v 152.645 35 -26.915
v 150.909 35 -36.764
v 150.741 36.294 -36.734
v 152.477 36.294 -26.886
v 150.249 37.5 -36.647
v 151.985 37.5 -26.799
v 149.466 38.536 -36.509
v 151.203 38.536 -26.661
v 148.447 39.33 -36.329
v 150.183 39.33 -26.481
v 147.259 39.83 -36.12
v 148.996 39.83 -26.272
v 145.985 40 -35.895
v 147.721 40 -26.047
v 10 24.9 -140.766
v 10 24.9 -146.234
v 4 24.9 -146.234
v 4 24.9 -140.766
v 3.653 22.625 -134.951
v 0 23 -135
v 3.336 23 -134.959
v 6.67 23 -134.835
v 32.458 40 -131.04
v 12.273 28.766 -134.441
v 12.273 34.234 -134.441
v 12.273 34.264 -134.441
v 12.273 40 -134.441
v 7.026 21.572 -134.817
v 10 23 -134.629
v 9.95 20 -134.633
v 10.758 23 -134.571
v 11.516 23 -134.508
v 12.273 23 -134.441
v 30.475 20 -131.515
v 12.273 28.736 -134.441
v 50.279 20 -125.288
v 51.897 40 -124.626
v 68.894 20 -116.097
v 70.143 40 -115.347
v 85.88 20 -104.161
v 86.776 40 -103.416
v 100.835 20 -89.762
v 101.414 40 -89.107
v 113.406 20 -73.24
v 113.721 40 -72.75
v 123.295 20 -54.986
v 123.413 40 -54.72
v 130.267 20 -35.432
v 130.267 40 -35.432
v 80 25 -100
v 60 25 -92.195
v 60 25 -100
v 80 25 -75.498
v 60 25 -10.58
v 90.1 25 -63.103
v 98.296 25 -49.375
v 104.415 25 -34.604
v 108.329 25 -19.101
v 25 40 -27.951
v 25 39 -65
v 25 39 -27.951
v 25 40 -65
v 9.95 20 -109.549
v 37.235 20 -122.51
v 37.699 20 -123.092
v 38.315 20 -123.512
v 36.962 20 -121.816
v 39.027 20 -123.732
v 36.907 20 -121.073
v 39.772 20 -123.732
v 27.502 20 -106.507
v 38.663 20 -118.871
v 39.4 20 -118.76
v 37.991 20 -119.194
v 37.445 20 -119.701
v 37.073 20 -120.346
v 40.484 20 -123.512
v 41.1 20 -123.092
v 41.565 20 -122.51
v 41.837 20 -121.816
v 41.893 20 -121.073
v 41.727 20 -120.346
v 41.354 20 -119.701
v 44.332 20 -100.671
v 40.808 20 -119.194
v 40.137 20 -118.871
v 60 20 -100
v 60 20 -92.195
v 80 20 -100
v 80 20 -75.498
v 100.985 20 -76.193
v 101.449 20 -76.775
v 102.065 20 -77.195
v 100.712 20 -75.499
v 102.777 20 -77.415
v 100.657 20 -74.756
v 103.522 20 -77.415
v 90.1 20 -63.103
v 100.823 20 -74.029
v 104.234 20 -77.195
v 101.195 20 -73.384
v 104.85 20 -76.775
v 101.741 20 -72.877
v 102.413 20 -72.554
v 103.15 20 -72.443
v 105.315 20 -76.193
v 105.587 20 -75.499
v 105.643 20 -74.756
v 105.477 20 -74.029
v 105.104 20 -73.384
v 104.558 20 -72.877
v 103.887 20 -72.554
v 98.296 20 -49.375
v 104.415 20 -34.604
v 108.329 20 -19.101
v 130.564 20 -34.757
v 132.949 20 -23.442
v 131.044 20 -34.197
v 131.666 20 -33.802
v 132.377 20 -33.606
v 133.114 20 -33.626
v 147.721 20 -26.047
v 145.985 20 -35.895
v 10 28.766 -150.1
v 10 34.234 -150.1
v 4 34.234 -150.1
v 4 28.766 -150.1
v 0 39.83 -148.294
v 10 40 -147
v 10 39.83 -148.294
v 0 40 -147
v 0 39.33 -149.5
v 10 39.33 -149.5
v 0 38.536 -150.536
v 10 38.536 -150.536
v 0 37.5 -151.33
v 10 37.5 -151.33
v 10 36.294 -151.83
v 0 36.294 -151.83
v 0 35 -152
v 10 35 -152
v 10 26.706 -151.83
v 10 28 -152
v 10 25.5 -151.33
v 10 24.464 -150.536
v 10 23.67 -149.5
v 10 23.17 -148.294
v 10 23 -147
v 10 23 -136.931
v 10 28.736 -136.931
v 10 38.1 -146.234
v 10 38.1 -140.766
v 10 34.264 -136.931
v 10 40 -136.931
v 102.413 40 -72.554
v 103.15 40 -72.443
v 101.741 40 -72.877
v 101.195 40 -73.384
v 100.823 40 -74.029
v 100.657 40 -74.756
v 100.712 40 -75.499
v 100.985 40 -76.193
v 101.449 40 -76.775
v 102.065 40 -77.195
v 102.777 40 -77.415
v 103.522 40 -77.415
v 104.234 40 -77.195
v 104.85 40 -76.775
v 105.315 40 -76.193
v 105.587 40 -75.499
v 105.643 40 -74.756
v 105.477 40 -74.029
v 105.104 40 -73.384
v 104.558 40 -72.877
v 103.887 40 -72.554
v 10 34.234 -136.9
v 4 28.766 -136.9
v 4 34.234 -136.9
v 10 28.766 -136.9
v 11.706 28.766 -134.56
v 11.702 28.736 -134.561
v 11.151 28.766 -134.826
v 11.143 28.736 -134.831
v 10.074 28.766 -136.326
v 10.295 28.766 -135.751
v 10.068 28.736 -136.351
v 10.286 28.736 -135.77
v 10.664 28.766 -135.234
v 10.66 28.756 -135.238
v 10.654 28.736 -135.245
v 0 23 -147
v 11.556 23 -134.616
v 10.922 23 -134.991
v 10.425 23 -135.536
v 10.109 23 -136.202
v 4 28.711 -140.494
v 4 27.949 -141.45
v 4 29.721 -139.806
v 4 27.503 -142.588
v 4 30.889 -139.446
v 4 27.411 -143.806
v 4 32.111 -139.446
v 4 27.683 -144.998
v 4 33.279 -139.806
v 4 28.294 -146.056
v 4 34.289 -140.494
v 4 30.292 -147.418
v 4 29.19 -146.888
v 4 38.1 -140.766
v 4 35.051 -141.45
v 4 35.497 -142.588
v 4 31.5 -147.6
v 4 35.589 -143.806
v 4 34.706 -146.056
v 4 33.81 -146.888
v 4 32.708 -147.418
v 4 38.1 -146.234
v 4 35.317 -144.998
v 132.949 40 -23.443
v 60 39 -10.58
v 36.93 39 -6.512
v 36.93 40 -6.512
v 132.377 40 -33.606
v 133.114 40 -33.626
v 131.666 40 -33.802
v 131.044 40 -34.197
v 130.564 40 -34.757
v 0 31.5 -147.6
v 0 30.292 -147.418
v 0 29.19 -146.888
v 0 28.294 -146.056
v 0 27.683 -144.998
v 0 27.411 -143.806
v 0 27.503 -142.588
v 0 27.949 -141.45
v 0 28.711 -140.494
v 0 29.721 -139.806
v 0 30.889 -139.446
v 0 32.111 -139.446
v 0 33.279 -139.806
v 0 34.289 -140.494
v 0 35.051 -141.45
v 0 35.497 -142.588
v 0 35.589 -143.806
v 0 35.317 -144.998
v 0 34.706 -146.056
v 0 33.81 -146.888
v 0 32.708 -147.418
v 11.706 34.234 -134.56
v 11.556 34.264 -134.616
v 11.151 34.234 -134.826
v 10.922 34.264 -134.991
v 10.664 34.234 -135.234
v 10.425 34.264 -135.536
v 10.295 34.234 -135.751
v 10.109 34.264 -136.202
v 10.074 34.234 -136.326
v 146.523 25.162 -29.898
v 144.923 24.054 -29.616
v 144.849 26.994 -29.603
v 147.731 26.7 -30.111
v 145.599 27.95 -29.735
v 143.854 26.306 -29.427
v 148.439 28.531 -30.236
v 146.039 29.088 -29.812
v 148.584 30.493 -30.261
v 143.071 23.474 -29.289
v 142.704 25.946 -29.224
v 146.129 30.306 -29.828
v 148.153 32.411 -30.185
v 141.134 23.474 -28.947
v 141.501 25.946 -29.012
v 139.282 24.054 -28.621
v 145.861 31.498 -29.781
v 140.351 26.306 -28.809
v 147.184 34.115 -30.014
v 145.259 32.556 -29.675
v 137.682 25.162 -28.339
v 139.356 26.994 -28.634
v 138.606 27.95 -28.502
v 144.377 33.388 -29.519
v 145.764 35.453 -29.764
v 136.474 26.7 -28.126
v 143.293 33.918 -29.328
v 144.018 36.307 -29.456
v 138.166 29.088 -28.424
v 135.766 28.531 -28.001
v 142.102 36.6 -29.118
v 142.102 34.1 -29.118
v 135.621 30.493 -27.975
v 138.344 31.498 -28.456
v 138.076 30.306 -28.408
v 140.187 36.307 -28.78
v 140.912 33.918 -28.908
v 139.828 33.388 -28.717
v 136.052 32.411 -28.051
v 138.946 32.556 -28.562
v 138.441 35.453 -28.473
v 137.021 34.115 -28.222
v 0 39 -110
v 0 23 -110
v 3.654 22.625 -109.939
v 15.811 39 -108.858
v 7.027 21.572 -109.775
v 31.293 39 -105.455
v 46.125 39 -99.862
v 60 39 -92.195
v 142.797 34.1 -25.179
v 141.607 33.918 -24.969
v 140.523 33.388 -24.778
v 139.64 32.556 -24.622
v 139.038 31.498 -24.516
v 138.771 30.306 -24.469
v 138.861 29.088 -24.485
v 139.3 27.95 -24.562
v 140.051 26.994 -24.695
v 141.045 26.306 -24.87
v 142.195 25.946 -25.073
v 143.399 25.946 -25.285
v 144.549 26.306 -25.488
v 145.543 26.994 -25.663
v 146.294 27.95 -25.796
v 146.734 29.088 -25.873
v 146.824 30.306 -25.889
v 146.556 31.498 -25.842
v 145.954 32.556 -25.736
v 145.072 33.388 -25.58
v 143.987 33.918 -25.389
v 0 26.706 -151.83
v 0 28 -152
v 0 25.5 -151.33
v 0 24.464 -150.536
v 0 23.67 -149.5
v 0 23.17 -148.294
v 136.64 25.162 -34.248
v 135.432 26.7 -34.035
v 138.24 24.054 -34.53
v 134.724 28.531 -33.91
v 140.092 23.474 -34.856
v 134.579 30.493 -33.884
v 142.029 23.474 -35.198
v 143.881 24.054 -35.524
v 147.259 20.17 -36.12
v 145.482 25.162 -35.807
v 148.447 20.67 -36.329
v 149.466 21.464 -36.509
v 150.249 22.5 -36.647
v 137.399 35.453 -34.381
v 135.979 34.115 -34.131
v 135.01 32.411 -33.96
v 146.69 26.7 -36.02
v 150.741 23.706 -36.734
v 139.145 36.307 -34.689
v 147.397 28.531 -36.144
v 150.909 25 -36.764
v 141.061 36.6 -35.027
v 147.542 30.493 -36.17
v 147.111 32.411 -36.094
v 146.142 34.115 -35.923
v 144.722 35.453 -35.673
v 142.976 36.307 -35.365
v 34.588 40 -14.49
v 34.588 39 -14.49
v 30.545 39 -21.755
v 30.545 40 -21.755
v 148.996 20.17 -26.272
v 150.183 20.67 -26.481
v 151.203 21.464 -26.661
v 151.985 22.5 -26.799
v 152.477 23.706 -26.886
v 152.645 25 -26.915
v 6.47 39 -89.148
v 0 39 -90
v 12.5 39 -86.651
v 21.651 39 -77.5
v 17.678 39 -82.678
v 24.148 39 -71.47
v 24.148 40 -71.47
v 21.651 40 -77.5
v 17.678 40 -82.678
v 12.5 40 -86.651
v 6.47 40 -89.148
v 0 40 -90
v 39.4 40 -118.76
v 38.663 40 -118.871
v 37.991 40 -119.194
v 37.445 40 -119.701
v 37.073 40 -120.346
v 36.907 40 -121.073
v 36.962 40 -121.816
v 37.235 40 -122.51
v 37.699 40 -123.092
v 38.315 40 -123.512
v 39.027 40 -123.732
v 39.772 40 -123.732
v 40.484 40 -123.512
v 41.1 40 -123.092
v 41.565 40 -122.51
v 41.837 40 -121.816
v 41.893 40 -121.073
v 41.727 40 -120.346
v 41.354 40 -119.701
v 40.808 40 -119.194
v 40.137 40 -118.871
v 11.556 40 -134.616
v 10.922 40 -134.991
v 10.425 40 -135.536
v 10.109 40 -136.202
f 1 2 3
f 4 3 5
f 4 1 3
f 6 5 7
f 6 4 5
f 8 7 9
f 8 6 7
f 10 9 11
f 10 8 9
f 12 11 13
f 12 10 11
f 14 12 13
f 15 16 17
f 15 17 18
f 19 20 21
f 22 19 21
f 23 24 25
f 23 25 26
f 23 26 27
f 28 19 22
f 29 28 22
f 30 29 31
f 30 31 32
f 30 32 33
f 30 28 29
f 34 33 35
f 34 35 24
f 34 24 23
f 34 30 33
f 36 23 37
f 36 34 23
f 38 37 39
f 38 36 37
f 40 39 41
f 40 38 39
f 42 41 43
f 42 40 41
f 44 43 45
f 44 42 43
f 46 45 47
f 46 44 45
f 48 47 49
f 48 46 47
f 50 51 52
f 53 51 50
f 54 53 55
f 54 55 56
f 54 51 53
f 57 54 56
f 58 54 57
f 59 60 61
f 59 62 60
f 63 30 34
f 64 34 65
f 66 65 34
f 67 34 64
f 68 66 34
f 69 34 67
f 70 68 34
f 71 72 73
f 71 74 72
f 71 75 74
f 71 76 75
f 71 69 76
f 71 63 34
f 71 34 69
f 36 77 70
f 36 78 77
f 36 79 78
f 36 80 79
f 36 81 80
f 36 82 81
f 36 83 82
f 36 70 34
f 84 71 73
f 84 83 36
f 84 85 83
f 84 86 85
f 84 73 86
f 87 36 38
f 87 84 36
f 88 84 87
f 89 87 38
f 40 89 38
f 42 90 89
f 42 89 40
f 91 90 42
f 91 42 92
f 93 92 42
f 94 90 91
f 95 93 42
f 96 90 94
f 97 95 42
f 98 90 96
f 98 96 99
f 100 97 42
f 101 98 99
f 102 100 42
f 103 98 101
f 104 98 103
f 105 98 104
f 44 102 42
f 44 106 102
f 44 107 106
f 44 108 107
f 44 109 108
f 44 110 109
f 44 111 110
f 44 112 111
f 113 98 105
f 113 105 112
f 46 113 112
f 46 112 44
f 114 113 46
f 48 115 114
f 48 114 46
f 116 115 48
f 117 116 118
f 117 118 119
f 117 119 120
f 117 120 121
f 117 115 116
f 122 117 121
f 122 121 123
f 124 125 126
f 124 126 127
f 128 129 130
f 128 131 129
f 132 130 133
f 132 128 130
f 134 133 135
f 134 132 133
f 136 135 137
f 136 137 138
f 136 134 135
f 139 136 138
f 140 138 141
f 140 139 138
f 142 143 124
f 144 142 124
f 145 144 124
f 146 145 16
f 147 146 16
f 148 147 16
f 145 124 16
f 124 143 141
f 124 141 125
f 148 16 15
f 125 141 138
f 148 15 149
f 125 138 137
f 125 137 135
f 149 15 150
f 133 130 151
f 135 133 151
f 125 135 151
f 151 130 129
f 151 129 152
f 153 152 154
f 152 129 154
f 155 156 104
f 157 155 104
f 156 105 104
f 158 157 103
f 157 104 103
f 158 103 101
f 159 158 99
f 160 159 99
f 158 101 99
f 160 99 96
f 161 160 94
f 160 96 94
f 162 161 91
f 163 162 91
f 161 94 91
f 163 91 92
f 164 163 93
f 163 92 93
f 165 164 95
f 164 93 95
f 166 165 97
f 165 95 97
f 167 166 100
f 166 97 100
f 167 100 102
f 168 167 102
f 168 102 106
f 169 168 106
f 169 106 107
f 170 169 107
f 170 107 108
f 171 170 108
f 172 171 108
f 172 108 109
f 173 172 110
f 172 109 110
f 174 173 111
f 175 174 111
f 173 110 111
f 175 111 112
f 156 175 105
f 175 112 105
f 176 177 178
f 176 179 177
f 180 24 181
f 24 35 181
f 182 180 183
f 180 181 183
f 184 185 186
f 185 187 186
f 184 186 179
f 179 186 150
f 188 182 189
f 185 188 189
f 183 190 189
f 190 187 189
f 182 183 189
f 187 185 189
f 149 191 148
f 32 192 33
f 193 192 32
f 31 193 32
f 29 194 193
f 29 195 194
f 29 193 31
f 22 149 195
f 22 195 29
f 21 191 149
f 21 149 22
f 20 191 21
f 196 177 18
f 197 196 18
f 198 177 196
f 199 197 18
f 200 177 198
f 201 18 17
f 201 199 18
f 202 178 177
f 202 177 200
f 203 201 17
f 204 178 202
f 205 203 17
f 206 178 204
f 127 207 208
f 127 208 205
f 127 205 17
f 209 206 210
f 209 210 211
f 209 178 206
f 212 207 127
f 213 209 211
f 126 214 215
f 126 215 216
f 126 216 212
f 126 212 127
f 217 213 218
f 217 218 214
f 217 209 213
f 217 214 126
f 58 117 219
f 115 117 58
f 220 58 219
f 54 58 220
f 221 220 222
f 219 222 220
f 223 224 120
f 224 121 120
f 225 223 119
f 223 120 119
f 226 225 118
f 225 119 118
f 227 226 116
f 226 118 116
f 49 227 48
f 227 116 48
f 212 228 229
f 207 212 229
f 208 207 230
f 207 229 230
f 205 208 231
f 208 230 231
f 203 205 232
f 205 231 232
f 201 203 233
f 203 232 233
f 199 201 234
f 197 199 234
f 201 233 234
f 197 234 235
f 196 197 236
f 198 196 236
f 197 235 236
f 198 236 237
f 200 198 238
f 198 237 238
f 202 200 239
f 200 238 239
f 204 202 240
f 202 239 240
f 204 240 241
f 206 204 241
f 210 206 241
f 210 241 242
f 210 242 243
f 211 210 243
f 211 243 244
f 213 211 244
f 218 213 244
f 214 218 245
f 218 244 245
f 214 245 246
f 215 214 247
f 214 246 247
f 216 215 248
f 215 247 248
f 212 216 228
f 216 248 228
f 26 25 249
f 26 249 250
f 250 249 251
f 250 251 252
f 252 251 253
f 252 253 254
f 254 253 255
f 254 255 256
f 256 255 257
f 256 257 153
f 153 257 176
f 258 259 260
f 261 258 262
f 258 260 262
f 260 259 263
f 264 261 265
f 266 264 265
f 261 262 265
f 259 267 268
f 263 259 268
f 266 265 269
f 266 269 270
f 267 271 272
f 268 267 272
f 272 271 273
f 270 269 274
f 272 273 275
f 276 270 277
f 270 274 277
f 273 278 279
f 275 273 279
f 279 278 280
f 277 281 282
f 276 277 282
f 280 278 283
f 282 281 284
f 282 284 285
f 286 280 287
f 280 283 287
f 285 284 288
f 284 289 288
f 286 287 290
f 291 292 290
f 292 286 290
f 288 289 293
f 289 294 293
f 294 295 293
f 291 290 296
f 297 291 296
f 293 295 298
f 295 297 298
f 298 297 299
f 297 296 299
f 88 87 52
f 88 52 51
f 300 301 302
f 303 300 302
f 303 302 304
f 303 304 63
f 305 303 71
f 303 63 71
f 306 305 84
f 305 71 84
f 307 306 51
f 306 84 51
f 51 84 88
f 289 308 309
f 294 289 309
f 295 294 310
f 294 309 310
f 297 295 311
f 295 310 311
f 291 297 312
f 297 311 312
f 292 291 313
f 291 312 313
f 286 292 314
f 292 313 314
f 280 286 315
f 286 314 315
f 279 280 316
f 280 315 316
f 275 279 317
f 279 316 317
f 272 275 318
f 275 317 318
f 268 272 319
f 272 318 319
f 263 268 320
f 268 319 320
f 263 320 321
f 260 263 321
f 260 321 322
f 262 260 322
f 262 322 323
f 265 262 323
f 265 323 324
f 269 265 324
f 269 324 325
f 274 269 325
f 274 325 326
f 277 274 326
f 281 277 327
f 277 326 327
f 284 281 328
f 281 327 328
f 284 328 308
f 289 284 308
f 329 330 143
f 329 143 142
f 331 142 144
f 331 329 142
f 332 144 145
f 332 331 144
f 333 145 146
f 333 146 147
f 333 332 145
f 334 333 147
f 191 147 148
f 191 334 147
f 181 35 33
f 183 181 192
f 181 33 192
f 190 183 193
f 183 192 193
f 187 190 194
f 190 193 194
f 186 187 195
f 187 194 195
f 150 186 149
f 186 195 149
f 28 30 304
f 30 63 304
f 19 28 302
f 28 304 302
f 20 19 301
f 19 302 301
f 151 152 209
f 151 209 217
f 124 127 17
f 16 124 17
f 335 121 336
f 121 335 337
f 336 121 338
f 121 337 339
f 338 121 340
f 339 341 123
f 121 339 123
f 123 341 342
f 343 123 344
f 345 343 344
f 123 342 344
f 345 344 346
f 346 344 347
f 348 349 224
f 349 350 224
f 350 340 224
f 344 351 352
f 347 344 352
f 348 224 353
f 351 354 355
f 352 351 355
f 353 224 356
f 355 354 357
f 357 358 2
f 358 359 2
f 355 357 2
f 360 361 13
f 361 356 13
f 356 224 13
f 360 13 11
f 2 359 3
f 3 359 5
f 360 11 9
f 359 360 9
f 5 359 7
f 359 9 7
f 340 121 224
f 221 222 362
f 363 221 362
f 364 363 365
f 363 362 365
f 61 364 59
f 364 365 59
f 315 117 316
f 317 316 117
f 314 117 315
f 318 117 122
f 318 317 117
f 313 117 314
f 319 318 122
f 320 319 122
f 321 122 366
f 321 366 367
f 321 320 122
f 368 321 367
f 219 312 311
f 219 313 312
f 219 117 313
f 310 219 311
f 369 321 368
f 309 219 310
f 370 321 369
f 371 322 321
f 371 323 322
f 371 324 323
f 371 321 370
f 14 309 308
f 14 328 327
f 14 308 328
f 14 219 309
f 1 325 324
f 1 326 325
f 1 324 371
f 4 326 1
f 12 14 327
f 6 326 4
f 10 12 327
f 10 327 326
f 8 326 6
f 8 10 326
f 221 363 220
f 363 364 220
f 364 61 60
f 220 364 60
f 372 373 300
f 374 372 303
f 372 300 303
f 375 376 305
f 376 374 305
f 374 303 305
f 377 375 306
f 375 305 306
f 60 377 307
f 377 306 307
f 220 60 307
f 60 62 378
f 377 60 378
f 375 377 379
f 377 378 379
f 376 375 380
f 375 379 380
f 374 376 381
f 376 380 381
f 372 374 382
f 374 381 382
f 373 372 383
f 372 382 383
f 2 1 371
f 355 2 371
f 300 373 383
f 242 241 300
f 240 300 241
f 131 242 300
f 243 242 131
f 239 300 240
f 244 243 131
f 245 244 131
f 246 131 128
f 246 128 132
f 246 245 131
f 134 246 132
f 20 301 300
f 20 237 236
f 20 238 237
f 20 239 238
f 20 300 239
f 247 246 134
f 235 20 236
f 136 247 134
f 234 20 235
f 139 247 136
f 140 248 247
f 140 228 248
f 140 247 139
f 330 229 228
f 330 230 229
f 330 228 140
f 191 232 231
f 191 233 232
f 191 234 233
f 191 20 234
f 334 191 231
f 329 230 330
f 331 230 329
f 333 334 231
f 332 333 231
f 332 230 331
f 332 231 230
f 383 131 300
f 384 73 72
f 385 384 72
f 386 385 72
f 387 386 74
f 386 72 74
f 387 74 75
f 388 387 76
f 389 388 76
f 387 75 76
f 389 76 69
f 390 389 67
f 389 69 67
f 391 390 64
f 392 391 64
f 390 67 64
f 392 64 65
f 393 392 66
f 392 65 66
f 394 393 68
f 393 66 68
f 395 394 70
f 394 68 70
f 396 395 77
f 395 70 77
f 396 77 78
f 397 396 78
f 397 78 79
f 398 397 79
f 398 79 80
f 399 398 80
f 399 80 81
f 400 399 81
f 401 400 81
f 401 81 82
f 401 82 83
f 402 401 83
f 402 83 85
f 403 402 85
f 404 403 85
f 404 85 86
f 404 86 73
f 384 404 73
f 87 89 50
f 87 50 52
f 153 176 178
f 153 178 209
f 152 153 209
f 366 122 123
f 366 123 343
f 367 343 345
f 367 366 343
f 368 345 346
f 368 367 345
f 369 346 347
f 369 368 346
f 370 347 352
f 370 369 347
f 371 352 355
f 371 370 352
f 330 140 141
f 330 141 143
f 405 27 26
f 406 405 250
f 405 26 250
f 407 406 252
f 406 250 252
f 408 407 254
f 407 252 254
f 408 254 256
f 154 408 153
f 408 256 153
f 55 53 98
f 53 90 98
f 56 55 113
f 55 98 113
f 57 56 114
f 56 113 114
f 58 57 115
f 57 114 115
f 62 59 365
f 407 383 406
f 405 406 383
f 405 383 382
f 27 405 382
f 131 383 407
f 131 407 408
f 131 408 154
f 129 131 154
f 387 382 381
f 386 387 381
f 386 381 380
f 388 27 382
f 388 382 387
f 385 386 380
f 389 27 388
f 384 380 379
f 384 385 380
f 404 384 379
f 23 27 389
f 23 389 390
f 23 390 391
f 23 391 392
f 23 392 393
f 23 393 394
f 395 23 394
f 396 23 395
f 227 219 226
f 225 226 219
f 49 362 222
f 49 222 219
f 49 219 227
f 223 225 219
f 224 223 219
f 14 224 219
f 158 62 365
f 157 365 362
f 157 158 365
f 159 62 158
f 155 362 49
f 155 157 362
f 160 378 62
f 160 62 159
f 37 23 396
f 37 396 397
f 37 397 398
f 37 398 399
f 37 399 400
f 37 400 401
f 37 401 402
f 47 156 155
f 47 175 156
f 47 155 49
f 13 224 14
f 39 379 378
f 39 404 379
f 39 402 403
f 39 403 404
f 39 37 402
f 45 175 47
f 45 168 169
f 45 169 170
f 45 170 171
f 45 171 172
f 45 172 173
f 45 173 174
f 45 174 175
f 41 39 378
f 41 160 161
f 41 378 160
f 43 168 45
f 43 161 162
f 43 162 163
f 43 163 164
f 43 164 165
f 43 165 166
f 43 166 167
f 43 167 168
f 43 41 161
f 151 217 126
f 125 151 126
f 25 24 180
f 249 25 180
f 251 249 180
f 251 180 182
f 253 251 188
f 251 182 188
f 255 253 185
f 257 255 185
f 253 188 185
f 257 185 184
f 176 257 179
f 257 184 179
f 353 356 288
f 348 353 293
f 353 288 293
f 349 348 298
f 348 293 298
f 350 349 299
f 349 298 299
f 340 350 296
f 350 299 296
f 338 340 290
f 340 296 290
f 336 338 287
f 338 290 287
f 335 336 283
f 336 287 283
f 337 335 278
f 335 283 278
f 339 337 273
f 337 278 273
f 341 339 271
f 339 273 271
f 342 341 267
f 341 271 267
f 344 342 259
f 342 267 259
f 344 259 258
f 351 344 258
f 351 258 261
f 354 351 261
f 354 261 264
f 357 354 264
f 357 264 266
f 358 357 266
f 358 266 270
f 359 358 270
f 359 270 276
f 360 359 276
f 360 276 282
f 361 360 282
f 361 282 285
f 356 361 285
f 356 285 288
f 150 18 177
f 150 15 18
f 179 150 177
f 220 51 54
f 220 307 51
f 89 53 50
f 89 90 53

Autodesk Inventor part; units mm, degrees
ref_plane "YZ Plane" through (0, 0, 0) normal (1, 0, 0) x (0, 1, 0)
ref_plane "XZ Plane" through (0, 0, 0) normal (0, 1, 0) x (-1, 0, 0)
ref_plane "XY Plane" through (0, 0, 0) normal (0, 0, 1) x (1, 0, 0)
sketch "Sketch1" plane through (0, 0, 0) normal (0, 1, 0) x (-1, 0, 0)
  circle A0 centre (0, 0) radius 135
  circle A1 centre (0, 0) radius 110
  dimension "d0" = 270
  dimension "d1" = 220
extrude "Extrusion1" add sketch "Sketch1" along normal blind 55
sketch "Sketch2" plane through (0, 0, 0) normal (0, 0, 1) x (1, 0, 0)
  circle A0 centre (0, 5) radius 18
  line L0 (135, 0) -> (-135, 0) projected
  point P0 (0, 0)
  dimension "d4" = 36
  dimension "d5" = 5
extrude "Extrusion2" cut sketch "Sketch2" against normal through all
sketch "Sketch3" plane through (0, 0, 0) normal (0, -1, 0) x (1, 0, 0)
  circle A0 centre (0, 0) radius 140
extrude "Extrusion3" cut sketch "Sketch3" against normal blind 20
sketch "Sketch4" plane through (0, 20, 0) normal (0, -1, 0) x (1, 0, 0)
  line L0 (0, 0) -> (70, 0)
  line L1 (80, -100) -> (60, -100)
  line L2 (60, -100) -> (60, 100)
  line L3 (60, 100) -> (80, 100)
  line L4 (80, 100) -> (80, -100)
  line L5 (80, -100) -> (60, 100) construction
  line L6 (60, -100) -> (80, 100) construction
  dimension "d10" = 70
  dimension "d11" = 20
  dimension "d12" = 200
extrude "Extrusion4" cut sketch "Sketch4" against normal through all
sketch "Sketch5" plane through (0, 55, 0) normal (0, 1, 0) x (1, 0, 0)
  circle A0 centre (0, 0) radius 127.5
  circle A1 centre (127.5, 0) radius 2
  circle A2 centre (103.1497, 74.9426) radius 2
  circle A3 centre (39.3997, 121.2597) radius 2
  circle A4 centre (-39.3997, 121.2597) radius 2
  circle A5 centre (-103.1497, 74.9426) radius 2
  circle A6 centre (-127.5, 0) radius 2
  circle A7 centre (-103.1497, -74.9426) radius 2
  circle A8 centre (-39.3997, -121.2597) radius 2
  circle A9 centre (39.3997, -121.2597) radius 2
  circle A10 centre (103.1497, -74.9426) radius 2
  dimension "d15" = 255
  dimension "d16" = 4
  dimension "d19" = 360
hole "Hole1" at (127.5, 55, 0) at (103.1497, 55, 74.9426) at (39.3997, 55, 121.2597) at (-39.3997, 55, 121.2597) at (-103.1497, 55, 74.9426) at (-127.5, 55, 0) at (-103.1497, 55, -74.9426) at (-39.3997, 55, -121.2597) at (39.3997, 55, -121.2597) at (103.1497, 55, -74.9426) direction (0, -1, 0) diameter 5 end through all
sketch "Sketch6" plane through (0, 55, 0) normal (0, 1, 0) x (1, 0, 0)
  circle A0 centre (0, 0) radius 140
extrude "Extrusion5" cut sketch "Sketch6" against normal blind 15
sketch "Sketch7" plane through (0, 40, 0) normal (0, 1, 0) x (1, 0, 0)
  circle A0 centre (0, 0) radius 140
  line L0 (80, -100) -> (80, -75.4983) projected
  line L1 (80, -100) -> (80, -75.4983)
  line L2 (60, -100) -> (80, -100) projected
  line L3 (80, -100) -> (60, -100)
  line L4 (60, -100) -> (60, -92.1954)
  line L5 (60, 100) -> (60, 92.1954) projected
  line L6 (60, 92.1954) -> (60, 100)
  line L7 (60, 100) -> (80, 100)
  line L8 (80, 100) -> (80, 75.4983)
  arc A1 (80, -75.4983) -> (80, 75.4983) centre (0, 0) ccw
  arc A2 (60, 92.1954) -> (60, -92.1954) centre (0, 0) ccw
  arc A3 (-25, -65) -> (25, -65) centre (0, -65) ccw
  arc A4 (25, 65) -> (-25, 65) centre (0, 65) ccw
  arc A5 (25, -27.9508) -> (25, 27.9508) centre (0, 0) ccw
  arc A6 (-25, 27.9508) -> (-25, -27.9508) centre (0, 0) ccw
  line L9 (25, 65) -> (25, 27.9508)
  line L10 (25, -27.9508) -> (25, -65)
  line L11 (-25, -65) -> (-25, -27.9508)
  line L12 (-25, 27.9508) -> (-25, 65)
extrude "Extrusion6" add sketch "Sketch7" against normal blind 1 contours L2 L4 A2 L5 L7 L8 A1 L0
sketch "Sketch8" plane through (0, 39, 0) normal (0, -1, 0) x (1, 0, 0)
  line L0 (80, -75.4983) -> (80, -100) projected
  line L1 (80, -100) -> (60, -100)
  line L2 (60, -100) -> (60, 100)
  line L3 (60, 100) -> (80, 100)
  line L4 (80, 100) -> (80, 75.4983)
  line L5 (80, -75.4983) -> (80, -100)
  arc A0 (80, -75.4983) -> (80, 75.4983) centre (0, 0) ccw
  arc A1 (60, 92.1954) -> (60, -92.1954) centre (0, 0) ccw
extrude "Extrusion7" add sketch "Sketch8" along normal blind 14 contours L0 L1 L2 L3 L4 A0
sketch "Sketch9" plane through (0, 20, 0) normal (0, -1, 0) x (1, 0, 0)
  arc A0 (9.9499, -134.6328) -> (-9.9499, -134.6328) centre (0, 0) ccw projected
  spline S0 degree 7 poles (9.9499, -134.6328) (9.4556, -134.6694) (8.9421, -134.7052) (8.4096, -134.74) (7.8582, -134.7735) (7.2882, -134.8052) (6.6998, -134.835) (5.2633, -134.8999) (4.3998, -134.933) (3.5087, -134.9604) (2.5962, -134.9814) (1.6691, -134.9951) (0.7345, -135.0012) (-1.7136, -134.9976) (-3.2083, -134.9756) (-4.6621, -134.9347) (-6.0536, -134.8776) (-7.364, -134.8084) (-8.5782, -134.7318) (-9.7236, -134.6494) (-9.7616, -134.6466) (-9.7995, -134.6439) (-9.8372, -134.6411) (-9.8749, -134.6384) (-9.9124, -134.6356) (-9.9499, -134.6328) knots 0 0 0 0 0 0 0 0 0.214533 0.214533 0.214533 0.214533 0.214533 0.214533 0.508291 0.508291 0.508291 0.508291 0.508291 0.508291 0.983641 0.983641 0.983641 0.983641 0.983641 0.983641 1 1 1 1 1 1 1 1 projected
  line L0 (0, 135) -> (0, -135)
  line L1 (132.949, -23.4425) -> (-132.949, 23.4425)
  point P0 (0, 0)
  dimension "d40" = 80
extrude "Extrusion8" cut sketch "Sketch9" against normal through all contours L1 L0 A0 | S0 A0 L1 L0 | L0 L1 A0 picked at (-11.9552, -89.0406)
sketch "Sketch10" plane through (0, 23, -135) normal (-1, 0, 0) x (0, 0, 1)
  line L0 (0, 17) -> (111.5575, 17) projected
  line L1 (2.5, 17) -> (-12, 17)
  line L2 (-17, 12) -> (-17, 5)
  line L3 (-12, 0) -> (2.5, 0)
  line L4 (2.5, 0) -> (2.5, 17)
  line L5 (0, 0) -> (0, 17) projected
  arc A0 (-17, 5) -> (-12, 0) centre (-12, 5) ccw
  arc A1 (-12, 17) -> (-17, 12) centre (-12, 12) ccw
  point P0 (135, -23)
  point P1 (-17, 0)
  point P2 (-17, 17)
  dimension "d43" = 19.5
  dimension "d44" = 17
  dimension "d45" = 17
  dimension "d46" = 5
extrude "Extrusion9" add sketch "Sketch10" against normal blind 10
sketch "Sketch11" plane through (10, 23, -135) normal (1, 0, 0) x (0, 0, -1)
  line L0 (15.1, 5.7662) -> (11.2338, 1.9)
  line L1 (11.2338, 1.9) -> (5.7662, 1.9)
  line L2 (5.7662, 1.9) -> (1.9, 5.7662)
  line L3 (1.9, 5.7662) -> (1.9, 11.2338)
  line L4 (1.9, 11.2338) -> (5.7662, 15.1)
  line L5 (5.7662, 15.1) -> (11.2338, 15.1)
  line L6 (11.2338, 15.1) -> (15.1, 11.2338)
  line L7 (15.1, 11.2338) -> (15.1, 5.7662)
  line L8 (17, 5) -> (17, 12) projected
  line L9 (-0.3709, 0) -> (12, 0) projected
  point P0 (-135, -23)
  point P1 (8.5, 8.5)
  point P2 (1.9306, 0)
  dimension "d50" = 8.5
  dimension "d51" = 8.5
  dimension "d52" = 13.2
extrude "Extrusion10" cut sketch "Sketch11" against normal blind 6
sketch "Sketch12" plane through (4, 23, -135) normal (1, 0, 0) x (0, 0, -1)
  line L0 (-0.3709, 0) -> (12, 0) projected
  line L1 (17, 5) -> (17, 12) projected
  point P0 (-135, -23)
  point P1 (8.5, 8.5)
  point P2 (1.9306, 0)
  dimension "d55" = 8.5
  dimension "d56" = 8.5
hole "Hole2" at (4, 31.5, -143.5) direction (-1, 0, 0) diameter 8.2 end through all
sketch "Sketch13" plane through (132.949, 20, -23.4425) normal (0.1736482, 0, 0.9848078) x (0.9848078, 0, -0.1736482)
  line L0 (-97.5, 20) -> (0, 20) projected
  line L1 (-2.5, 20) -> (15, 20)
  line L2 (20, 15) -> (20, 5)
  line L3 (15, 0) -> (-2.5, 0)
  line L4 (-2.5, 0) -> (-2.5, 20)
  line L5 (0, 20) -> (0, 0) projected
  arc A0 (20, 15) -> (15, 20) centre (15, 15) ccw
  arc A1 (15, 0) -> (20, 5) centre (15, 5) ccw
  point P0 (-135, -20)
  point P1 (20, 0)
  point P2 (20, 20)
  dimension "d64" = 22.5
  dimension "d65" = 20
  dimension "d66" = 20
  dimension "d67" = 5
extrude "Extrusion11" add sketch "Sketch13" against normal blind 10
sketch "Sketch14" plane through (131.2126, 20, -33.2906) normal (-0.1736482, 0, -0.9848078) x (-0.9848078, 0, 0.1736482)
  line L0 (0.3709, 20) -> (-15, 20) projected
  line L1 (-20, 15) -> (-20, 5) projected
  point P0 (135, -20)
  point P1 (-10, 10)
  dimension "d70" = 10
  dimension "d71" = 10
hole "Hole3" at (141.0606, 30, -35.0271) direction (0.1736482, 0, 0.9848078) diameter 8.2 end through all counterbore diameter 13.2 counterbore depth 6
fillet "Fillet2" radius 2.5 2 edges at (130.8473, 30, -33.2262) (10, 31.5, -134.6291)
properties part number "Cylinder Spacer Top_Q2"
